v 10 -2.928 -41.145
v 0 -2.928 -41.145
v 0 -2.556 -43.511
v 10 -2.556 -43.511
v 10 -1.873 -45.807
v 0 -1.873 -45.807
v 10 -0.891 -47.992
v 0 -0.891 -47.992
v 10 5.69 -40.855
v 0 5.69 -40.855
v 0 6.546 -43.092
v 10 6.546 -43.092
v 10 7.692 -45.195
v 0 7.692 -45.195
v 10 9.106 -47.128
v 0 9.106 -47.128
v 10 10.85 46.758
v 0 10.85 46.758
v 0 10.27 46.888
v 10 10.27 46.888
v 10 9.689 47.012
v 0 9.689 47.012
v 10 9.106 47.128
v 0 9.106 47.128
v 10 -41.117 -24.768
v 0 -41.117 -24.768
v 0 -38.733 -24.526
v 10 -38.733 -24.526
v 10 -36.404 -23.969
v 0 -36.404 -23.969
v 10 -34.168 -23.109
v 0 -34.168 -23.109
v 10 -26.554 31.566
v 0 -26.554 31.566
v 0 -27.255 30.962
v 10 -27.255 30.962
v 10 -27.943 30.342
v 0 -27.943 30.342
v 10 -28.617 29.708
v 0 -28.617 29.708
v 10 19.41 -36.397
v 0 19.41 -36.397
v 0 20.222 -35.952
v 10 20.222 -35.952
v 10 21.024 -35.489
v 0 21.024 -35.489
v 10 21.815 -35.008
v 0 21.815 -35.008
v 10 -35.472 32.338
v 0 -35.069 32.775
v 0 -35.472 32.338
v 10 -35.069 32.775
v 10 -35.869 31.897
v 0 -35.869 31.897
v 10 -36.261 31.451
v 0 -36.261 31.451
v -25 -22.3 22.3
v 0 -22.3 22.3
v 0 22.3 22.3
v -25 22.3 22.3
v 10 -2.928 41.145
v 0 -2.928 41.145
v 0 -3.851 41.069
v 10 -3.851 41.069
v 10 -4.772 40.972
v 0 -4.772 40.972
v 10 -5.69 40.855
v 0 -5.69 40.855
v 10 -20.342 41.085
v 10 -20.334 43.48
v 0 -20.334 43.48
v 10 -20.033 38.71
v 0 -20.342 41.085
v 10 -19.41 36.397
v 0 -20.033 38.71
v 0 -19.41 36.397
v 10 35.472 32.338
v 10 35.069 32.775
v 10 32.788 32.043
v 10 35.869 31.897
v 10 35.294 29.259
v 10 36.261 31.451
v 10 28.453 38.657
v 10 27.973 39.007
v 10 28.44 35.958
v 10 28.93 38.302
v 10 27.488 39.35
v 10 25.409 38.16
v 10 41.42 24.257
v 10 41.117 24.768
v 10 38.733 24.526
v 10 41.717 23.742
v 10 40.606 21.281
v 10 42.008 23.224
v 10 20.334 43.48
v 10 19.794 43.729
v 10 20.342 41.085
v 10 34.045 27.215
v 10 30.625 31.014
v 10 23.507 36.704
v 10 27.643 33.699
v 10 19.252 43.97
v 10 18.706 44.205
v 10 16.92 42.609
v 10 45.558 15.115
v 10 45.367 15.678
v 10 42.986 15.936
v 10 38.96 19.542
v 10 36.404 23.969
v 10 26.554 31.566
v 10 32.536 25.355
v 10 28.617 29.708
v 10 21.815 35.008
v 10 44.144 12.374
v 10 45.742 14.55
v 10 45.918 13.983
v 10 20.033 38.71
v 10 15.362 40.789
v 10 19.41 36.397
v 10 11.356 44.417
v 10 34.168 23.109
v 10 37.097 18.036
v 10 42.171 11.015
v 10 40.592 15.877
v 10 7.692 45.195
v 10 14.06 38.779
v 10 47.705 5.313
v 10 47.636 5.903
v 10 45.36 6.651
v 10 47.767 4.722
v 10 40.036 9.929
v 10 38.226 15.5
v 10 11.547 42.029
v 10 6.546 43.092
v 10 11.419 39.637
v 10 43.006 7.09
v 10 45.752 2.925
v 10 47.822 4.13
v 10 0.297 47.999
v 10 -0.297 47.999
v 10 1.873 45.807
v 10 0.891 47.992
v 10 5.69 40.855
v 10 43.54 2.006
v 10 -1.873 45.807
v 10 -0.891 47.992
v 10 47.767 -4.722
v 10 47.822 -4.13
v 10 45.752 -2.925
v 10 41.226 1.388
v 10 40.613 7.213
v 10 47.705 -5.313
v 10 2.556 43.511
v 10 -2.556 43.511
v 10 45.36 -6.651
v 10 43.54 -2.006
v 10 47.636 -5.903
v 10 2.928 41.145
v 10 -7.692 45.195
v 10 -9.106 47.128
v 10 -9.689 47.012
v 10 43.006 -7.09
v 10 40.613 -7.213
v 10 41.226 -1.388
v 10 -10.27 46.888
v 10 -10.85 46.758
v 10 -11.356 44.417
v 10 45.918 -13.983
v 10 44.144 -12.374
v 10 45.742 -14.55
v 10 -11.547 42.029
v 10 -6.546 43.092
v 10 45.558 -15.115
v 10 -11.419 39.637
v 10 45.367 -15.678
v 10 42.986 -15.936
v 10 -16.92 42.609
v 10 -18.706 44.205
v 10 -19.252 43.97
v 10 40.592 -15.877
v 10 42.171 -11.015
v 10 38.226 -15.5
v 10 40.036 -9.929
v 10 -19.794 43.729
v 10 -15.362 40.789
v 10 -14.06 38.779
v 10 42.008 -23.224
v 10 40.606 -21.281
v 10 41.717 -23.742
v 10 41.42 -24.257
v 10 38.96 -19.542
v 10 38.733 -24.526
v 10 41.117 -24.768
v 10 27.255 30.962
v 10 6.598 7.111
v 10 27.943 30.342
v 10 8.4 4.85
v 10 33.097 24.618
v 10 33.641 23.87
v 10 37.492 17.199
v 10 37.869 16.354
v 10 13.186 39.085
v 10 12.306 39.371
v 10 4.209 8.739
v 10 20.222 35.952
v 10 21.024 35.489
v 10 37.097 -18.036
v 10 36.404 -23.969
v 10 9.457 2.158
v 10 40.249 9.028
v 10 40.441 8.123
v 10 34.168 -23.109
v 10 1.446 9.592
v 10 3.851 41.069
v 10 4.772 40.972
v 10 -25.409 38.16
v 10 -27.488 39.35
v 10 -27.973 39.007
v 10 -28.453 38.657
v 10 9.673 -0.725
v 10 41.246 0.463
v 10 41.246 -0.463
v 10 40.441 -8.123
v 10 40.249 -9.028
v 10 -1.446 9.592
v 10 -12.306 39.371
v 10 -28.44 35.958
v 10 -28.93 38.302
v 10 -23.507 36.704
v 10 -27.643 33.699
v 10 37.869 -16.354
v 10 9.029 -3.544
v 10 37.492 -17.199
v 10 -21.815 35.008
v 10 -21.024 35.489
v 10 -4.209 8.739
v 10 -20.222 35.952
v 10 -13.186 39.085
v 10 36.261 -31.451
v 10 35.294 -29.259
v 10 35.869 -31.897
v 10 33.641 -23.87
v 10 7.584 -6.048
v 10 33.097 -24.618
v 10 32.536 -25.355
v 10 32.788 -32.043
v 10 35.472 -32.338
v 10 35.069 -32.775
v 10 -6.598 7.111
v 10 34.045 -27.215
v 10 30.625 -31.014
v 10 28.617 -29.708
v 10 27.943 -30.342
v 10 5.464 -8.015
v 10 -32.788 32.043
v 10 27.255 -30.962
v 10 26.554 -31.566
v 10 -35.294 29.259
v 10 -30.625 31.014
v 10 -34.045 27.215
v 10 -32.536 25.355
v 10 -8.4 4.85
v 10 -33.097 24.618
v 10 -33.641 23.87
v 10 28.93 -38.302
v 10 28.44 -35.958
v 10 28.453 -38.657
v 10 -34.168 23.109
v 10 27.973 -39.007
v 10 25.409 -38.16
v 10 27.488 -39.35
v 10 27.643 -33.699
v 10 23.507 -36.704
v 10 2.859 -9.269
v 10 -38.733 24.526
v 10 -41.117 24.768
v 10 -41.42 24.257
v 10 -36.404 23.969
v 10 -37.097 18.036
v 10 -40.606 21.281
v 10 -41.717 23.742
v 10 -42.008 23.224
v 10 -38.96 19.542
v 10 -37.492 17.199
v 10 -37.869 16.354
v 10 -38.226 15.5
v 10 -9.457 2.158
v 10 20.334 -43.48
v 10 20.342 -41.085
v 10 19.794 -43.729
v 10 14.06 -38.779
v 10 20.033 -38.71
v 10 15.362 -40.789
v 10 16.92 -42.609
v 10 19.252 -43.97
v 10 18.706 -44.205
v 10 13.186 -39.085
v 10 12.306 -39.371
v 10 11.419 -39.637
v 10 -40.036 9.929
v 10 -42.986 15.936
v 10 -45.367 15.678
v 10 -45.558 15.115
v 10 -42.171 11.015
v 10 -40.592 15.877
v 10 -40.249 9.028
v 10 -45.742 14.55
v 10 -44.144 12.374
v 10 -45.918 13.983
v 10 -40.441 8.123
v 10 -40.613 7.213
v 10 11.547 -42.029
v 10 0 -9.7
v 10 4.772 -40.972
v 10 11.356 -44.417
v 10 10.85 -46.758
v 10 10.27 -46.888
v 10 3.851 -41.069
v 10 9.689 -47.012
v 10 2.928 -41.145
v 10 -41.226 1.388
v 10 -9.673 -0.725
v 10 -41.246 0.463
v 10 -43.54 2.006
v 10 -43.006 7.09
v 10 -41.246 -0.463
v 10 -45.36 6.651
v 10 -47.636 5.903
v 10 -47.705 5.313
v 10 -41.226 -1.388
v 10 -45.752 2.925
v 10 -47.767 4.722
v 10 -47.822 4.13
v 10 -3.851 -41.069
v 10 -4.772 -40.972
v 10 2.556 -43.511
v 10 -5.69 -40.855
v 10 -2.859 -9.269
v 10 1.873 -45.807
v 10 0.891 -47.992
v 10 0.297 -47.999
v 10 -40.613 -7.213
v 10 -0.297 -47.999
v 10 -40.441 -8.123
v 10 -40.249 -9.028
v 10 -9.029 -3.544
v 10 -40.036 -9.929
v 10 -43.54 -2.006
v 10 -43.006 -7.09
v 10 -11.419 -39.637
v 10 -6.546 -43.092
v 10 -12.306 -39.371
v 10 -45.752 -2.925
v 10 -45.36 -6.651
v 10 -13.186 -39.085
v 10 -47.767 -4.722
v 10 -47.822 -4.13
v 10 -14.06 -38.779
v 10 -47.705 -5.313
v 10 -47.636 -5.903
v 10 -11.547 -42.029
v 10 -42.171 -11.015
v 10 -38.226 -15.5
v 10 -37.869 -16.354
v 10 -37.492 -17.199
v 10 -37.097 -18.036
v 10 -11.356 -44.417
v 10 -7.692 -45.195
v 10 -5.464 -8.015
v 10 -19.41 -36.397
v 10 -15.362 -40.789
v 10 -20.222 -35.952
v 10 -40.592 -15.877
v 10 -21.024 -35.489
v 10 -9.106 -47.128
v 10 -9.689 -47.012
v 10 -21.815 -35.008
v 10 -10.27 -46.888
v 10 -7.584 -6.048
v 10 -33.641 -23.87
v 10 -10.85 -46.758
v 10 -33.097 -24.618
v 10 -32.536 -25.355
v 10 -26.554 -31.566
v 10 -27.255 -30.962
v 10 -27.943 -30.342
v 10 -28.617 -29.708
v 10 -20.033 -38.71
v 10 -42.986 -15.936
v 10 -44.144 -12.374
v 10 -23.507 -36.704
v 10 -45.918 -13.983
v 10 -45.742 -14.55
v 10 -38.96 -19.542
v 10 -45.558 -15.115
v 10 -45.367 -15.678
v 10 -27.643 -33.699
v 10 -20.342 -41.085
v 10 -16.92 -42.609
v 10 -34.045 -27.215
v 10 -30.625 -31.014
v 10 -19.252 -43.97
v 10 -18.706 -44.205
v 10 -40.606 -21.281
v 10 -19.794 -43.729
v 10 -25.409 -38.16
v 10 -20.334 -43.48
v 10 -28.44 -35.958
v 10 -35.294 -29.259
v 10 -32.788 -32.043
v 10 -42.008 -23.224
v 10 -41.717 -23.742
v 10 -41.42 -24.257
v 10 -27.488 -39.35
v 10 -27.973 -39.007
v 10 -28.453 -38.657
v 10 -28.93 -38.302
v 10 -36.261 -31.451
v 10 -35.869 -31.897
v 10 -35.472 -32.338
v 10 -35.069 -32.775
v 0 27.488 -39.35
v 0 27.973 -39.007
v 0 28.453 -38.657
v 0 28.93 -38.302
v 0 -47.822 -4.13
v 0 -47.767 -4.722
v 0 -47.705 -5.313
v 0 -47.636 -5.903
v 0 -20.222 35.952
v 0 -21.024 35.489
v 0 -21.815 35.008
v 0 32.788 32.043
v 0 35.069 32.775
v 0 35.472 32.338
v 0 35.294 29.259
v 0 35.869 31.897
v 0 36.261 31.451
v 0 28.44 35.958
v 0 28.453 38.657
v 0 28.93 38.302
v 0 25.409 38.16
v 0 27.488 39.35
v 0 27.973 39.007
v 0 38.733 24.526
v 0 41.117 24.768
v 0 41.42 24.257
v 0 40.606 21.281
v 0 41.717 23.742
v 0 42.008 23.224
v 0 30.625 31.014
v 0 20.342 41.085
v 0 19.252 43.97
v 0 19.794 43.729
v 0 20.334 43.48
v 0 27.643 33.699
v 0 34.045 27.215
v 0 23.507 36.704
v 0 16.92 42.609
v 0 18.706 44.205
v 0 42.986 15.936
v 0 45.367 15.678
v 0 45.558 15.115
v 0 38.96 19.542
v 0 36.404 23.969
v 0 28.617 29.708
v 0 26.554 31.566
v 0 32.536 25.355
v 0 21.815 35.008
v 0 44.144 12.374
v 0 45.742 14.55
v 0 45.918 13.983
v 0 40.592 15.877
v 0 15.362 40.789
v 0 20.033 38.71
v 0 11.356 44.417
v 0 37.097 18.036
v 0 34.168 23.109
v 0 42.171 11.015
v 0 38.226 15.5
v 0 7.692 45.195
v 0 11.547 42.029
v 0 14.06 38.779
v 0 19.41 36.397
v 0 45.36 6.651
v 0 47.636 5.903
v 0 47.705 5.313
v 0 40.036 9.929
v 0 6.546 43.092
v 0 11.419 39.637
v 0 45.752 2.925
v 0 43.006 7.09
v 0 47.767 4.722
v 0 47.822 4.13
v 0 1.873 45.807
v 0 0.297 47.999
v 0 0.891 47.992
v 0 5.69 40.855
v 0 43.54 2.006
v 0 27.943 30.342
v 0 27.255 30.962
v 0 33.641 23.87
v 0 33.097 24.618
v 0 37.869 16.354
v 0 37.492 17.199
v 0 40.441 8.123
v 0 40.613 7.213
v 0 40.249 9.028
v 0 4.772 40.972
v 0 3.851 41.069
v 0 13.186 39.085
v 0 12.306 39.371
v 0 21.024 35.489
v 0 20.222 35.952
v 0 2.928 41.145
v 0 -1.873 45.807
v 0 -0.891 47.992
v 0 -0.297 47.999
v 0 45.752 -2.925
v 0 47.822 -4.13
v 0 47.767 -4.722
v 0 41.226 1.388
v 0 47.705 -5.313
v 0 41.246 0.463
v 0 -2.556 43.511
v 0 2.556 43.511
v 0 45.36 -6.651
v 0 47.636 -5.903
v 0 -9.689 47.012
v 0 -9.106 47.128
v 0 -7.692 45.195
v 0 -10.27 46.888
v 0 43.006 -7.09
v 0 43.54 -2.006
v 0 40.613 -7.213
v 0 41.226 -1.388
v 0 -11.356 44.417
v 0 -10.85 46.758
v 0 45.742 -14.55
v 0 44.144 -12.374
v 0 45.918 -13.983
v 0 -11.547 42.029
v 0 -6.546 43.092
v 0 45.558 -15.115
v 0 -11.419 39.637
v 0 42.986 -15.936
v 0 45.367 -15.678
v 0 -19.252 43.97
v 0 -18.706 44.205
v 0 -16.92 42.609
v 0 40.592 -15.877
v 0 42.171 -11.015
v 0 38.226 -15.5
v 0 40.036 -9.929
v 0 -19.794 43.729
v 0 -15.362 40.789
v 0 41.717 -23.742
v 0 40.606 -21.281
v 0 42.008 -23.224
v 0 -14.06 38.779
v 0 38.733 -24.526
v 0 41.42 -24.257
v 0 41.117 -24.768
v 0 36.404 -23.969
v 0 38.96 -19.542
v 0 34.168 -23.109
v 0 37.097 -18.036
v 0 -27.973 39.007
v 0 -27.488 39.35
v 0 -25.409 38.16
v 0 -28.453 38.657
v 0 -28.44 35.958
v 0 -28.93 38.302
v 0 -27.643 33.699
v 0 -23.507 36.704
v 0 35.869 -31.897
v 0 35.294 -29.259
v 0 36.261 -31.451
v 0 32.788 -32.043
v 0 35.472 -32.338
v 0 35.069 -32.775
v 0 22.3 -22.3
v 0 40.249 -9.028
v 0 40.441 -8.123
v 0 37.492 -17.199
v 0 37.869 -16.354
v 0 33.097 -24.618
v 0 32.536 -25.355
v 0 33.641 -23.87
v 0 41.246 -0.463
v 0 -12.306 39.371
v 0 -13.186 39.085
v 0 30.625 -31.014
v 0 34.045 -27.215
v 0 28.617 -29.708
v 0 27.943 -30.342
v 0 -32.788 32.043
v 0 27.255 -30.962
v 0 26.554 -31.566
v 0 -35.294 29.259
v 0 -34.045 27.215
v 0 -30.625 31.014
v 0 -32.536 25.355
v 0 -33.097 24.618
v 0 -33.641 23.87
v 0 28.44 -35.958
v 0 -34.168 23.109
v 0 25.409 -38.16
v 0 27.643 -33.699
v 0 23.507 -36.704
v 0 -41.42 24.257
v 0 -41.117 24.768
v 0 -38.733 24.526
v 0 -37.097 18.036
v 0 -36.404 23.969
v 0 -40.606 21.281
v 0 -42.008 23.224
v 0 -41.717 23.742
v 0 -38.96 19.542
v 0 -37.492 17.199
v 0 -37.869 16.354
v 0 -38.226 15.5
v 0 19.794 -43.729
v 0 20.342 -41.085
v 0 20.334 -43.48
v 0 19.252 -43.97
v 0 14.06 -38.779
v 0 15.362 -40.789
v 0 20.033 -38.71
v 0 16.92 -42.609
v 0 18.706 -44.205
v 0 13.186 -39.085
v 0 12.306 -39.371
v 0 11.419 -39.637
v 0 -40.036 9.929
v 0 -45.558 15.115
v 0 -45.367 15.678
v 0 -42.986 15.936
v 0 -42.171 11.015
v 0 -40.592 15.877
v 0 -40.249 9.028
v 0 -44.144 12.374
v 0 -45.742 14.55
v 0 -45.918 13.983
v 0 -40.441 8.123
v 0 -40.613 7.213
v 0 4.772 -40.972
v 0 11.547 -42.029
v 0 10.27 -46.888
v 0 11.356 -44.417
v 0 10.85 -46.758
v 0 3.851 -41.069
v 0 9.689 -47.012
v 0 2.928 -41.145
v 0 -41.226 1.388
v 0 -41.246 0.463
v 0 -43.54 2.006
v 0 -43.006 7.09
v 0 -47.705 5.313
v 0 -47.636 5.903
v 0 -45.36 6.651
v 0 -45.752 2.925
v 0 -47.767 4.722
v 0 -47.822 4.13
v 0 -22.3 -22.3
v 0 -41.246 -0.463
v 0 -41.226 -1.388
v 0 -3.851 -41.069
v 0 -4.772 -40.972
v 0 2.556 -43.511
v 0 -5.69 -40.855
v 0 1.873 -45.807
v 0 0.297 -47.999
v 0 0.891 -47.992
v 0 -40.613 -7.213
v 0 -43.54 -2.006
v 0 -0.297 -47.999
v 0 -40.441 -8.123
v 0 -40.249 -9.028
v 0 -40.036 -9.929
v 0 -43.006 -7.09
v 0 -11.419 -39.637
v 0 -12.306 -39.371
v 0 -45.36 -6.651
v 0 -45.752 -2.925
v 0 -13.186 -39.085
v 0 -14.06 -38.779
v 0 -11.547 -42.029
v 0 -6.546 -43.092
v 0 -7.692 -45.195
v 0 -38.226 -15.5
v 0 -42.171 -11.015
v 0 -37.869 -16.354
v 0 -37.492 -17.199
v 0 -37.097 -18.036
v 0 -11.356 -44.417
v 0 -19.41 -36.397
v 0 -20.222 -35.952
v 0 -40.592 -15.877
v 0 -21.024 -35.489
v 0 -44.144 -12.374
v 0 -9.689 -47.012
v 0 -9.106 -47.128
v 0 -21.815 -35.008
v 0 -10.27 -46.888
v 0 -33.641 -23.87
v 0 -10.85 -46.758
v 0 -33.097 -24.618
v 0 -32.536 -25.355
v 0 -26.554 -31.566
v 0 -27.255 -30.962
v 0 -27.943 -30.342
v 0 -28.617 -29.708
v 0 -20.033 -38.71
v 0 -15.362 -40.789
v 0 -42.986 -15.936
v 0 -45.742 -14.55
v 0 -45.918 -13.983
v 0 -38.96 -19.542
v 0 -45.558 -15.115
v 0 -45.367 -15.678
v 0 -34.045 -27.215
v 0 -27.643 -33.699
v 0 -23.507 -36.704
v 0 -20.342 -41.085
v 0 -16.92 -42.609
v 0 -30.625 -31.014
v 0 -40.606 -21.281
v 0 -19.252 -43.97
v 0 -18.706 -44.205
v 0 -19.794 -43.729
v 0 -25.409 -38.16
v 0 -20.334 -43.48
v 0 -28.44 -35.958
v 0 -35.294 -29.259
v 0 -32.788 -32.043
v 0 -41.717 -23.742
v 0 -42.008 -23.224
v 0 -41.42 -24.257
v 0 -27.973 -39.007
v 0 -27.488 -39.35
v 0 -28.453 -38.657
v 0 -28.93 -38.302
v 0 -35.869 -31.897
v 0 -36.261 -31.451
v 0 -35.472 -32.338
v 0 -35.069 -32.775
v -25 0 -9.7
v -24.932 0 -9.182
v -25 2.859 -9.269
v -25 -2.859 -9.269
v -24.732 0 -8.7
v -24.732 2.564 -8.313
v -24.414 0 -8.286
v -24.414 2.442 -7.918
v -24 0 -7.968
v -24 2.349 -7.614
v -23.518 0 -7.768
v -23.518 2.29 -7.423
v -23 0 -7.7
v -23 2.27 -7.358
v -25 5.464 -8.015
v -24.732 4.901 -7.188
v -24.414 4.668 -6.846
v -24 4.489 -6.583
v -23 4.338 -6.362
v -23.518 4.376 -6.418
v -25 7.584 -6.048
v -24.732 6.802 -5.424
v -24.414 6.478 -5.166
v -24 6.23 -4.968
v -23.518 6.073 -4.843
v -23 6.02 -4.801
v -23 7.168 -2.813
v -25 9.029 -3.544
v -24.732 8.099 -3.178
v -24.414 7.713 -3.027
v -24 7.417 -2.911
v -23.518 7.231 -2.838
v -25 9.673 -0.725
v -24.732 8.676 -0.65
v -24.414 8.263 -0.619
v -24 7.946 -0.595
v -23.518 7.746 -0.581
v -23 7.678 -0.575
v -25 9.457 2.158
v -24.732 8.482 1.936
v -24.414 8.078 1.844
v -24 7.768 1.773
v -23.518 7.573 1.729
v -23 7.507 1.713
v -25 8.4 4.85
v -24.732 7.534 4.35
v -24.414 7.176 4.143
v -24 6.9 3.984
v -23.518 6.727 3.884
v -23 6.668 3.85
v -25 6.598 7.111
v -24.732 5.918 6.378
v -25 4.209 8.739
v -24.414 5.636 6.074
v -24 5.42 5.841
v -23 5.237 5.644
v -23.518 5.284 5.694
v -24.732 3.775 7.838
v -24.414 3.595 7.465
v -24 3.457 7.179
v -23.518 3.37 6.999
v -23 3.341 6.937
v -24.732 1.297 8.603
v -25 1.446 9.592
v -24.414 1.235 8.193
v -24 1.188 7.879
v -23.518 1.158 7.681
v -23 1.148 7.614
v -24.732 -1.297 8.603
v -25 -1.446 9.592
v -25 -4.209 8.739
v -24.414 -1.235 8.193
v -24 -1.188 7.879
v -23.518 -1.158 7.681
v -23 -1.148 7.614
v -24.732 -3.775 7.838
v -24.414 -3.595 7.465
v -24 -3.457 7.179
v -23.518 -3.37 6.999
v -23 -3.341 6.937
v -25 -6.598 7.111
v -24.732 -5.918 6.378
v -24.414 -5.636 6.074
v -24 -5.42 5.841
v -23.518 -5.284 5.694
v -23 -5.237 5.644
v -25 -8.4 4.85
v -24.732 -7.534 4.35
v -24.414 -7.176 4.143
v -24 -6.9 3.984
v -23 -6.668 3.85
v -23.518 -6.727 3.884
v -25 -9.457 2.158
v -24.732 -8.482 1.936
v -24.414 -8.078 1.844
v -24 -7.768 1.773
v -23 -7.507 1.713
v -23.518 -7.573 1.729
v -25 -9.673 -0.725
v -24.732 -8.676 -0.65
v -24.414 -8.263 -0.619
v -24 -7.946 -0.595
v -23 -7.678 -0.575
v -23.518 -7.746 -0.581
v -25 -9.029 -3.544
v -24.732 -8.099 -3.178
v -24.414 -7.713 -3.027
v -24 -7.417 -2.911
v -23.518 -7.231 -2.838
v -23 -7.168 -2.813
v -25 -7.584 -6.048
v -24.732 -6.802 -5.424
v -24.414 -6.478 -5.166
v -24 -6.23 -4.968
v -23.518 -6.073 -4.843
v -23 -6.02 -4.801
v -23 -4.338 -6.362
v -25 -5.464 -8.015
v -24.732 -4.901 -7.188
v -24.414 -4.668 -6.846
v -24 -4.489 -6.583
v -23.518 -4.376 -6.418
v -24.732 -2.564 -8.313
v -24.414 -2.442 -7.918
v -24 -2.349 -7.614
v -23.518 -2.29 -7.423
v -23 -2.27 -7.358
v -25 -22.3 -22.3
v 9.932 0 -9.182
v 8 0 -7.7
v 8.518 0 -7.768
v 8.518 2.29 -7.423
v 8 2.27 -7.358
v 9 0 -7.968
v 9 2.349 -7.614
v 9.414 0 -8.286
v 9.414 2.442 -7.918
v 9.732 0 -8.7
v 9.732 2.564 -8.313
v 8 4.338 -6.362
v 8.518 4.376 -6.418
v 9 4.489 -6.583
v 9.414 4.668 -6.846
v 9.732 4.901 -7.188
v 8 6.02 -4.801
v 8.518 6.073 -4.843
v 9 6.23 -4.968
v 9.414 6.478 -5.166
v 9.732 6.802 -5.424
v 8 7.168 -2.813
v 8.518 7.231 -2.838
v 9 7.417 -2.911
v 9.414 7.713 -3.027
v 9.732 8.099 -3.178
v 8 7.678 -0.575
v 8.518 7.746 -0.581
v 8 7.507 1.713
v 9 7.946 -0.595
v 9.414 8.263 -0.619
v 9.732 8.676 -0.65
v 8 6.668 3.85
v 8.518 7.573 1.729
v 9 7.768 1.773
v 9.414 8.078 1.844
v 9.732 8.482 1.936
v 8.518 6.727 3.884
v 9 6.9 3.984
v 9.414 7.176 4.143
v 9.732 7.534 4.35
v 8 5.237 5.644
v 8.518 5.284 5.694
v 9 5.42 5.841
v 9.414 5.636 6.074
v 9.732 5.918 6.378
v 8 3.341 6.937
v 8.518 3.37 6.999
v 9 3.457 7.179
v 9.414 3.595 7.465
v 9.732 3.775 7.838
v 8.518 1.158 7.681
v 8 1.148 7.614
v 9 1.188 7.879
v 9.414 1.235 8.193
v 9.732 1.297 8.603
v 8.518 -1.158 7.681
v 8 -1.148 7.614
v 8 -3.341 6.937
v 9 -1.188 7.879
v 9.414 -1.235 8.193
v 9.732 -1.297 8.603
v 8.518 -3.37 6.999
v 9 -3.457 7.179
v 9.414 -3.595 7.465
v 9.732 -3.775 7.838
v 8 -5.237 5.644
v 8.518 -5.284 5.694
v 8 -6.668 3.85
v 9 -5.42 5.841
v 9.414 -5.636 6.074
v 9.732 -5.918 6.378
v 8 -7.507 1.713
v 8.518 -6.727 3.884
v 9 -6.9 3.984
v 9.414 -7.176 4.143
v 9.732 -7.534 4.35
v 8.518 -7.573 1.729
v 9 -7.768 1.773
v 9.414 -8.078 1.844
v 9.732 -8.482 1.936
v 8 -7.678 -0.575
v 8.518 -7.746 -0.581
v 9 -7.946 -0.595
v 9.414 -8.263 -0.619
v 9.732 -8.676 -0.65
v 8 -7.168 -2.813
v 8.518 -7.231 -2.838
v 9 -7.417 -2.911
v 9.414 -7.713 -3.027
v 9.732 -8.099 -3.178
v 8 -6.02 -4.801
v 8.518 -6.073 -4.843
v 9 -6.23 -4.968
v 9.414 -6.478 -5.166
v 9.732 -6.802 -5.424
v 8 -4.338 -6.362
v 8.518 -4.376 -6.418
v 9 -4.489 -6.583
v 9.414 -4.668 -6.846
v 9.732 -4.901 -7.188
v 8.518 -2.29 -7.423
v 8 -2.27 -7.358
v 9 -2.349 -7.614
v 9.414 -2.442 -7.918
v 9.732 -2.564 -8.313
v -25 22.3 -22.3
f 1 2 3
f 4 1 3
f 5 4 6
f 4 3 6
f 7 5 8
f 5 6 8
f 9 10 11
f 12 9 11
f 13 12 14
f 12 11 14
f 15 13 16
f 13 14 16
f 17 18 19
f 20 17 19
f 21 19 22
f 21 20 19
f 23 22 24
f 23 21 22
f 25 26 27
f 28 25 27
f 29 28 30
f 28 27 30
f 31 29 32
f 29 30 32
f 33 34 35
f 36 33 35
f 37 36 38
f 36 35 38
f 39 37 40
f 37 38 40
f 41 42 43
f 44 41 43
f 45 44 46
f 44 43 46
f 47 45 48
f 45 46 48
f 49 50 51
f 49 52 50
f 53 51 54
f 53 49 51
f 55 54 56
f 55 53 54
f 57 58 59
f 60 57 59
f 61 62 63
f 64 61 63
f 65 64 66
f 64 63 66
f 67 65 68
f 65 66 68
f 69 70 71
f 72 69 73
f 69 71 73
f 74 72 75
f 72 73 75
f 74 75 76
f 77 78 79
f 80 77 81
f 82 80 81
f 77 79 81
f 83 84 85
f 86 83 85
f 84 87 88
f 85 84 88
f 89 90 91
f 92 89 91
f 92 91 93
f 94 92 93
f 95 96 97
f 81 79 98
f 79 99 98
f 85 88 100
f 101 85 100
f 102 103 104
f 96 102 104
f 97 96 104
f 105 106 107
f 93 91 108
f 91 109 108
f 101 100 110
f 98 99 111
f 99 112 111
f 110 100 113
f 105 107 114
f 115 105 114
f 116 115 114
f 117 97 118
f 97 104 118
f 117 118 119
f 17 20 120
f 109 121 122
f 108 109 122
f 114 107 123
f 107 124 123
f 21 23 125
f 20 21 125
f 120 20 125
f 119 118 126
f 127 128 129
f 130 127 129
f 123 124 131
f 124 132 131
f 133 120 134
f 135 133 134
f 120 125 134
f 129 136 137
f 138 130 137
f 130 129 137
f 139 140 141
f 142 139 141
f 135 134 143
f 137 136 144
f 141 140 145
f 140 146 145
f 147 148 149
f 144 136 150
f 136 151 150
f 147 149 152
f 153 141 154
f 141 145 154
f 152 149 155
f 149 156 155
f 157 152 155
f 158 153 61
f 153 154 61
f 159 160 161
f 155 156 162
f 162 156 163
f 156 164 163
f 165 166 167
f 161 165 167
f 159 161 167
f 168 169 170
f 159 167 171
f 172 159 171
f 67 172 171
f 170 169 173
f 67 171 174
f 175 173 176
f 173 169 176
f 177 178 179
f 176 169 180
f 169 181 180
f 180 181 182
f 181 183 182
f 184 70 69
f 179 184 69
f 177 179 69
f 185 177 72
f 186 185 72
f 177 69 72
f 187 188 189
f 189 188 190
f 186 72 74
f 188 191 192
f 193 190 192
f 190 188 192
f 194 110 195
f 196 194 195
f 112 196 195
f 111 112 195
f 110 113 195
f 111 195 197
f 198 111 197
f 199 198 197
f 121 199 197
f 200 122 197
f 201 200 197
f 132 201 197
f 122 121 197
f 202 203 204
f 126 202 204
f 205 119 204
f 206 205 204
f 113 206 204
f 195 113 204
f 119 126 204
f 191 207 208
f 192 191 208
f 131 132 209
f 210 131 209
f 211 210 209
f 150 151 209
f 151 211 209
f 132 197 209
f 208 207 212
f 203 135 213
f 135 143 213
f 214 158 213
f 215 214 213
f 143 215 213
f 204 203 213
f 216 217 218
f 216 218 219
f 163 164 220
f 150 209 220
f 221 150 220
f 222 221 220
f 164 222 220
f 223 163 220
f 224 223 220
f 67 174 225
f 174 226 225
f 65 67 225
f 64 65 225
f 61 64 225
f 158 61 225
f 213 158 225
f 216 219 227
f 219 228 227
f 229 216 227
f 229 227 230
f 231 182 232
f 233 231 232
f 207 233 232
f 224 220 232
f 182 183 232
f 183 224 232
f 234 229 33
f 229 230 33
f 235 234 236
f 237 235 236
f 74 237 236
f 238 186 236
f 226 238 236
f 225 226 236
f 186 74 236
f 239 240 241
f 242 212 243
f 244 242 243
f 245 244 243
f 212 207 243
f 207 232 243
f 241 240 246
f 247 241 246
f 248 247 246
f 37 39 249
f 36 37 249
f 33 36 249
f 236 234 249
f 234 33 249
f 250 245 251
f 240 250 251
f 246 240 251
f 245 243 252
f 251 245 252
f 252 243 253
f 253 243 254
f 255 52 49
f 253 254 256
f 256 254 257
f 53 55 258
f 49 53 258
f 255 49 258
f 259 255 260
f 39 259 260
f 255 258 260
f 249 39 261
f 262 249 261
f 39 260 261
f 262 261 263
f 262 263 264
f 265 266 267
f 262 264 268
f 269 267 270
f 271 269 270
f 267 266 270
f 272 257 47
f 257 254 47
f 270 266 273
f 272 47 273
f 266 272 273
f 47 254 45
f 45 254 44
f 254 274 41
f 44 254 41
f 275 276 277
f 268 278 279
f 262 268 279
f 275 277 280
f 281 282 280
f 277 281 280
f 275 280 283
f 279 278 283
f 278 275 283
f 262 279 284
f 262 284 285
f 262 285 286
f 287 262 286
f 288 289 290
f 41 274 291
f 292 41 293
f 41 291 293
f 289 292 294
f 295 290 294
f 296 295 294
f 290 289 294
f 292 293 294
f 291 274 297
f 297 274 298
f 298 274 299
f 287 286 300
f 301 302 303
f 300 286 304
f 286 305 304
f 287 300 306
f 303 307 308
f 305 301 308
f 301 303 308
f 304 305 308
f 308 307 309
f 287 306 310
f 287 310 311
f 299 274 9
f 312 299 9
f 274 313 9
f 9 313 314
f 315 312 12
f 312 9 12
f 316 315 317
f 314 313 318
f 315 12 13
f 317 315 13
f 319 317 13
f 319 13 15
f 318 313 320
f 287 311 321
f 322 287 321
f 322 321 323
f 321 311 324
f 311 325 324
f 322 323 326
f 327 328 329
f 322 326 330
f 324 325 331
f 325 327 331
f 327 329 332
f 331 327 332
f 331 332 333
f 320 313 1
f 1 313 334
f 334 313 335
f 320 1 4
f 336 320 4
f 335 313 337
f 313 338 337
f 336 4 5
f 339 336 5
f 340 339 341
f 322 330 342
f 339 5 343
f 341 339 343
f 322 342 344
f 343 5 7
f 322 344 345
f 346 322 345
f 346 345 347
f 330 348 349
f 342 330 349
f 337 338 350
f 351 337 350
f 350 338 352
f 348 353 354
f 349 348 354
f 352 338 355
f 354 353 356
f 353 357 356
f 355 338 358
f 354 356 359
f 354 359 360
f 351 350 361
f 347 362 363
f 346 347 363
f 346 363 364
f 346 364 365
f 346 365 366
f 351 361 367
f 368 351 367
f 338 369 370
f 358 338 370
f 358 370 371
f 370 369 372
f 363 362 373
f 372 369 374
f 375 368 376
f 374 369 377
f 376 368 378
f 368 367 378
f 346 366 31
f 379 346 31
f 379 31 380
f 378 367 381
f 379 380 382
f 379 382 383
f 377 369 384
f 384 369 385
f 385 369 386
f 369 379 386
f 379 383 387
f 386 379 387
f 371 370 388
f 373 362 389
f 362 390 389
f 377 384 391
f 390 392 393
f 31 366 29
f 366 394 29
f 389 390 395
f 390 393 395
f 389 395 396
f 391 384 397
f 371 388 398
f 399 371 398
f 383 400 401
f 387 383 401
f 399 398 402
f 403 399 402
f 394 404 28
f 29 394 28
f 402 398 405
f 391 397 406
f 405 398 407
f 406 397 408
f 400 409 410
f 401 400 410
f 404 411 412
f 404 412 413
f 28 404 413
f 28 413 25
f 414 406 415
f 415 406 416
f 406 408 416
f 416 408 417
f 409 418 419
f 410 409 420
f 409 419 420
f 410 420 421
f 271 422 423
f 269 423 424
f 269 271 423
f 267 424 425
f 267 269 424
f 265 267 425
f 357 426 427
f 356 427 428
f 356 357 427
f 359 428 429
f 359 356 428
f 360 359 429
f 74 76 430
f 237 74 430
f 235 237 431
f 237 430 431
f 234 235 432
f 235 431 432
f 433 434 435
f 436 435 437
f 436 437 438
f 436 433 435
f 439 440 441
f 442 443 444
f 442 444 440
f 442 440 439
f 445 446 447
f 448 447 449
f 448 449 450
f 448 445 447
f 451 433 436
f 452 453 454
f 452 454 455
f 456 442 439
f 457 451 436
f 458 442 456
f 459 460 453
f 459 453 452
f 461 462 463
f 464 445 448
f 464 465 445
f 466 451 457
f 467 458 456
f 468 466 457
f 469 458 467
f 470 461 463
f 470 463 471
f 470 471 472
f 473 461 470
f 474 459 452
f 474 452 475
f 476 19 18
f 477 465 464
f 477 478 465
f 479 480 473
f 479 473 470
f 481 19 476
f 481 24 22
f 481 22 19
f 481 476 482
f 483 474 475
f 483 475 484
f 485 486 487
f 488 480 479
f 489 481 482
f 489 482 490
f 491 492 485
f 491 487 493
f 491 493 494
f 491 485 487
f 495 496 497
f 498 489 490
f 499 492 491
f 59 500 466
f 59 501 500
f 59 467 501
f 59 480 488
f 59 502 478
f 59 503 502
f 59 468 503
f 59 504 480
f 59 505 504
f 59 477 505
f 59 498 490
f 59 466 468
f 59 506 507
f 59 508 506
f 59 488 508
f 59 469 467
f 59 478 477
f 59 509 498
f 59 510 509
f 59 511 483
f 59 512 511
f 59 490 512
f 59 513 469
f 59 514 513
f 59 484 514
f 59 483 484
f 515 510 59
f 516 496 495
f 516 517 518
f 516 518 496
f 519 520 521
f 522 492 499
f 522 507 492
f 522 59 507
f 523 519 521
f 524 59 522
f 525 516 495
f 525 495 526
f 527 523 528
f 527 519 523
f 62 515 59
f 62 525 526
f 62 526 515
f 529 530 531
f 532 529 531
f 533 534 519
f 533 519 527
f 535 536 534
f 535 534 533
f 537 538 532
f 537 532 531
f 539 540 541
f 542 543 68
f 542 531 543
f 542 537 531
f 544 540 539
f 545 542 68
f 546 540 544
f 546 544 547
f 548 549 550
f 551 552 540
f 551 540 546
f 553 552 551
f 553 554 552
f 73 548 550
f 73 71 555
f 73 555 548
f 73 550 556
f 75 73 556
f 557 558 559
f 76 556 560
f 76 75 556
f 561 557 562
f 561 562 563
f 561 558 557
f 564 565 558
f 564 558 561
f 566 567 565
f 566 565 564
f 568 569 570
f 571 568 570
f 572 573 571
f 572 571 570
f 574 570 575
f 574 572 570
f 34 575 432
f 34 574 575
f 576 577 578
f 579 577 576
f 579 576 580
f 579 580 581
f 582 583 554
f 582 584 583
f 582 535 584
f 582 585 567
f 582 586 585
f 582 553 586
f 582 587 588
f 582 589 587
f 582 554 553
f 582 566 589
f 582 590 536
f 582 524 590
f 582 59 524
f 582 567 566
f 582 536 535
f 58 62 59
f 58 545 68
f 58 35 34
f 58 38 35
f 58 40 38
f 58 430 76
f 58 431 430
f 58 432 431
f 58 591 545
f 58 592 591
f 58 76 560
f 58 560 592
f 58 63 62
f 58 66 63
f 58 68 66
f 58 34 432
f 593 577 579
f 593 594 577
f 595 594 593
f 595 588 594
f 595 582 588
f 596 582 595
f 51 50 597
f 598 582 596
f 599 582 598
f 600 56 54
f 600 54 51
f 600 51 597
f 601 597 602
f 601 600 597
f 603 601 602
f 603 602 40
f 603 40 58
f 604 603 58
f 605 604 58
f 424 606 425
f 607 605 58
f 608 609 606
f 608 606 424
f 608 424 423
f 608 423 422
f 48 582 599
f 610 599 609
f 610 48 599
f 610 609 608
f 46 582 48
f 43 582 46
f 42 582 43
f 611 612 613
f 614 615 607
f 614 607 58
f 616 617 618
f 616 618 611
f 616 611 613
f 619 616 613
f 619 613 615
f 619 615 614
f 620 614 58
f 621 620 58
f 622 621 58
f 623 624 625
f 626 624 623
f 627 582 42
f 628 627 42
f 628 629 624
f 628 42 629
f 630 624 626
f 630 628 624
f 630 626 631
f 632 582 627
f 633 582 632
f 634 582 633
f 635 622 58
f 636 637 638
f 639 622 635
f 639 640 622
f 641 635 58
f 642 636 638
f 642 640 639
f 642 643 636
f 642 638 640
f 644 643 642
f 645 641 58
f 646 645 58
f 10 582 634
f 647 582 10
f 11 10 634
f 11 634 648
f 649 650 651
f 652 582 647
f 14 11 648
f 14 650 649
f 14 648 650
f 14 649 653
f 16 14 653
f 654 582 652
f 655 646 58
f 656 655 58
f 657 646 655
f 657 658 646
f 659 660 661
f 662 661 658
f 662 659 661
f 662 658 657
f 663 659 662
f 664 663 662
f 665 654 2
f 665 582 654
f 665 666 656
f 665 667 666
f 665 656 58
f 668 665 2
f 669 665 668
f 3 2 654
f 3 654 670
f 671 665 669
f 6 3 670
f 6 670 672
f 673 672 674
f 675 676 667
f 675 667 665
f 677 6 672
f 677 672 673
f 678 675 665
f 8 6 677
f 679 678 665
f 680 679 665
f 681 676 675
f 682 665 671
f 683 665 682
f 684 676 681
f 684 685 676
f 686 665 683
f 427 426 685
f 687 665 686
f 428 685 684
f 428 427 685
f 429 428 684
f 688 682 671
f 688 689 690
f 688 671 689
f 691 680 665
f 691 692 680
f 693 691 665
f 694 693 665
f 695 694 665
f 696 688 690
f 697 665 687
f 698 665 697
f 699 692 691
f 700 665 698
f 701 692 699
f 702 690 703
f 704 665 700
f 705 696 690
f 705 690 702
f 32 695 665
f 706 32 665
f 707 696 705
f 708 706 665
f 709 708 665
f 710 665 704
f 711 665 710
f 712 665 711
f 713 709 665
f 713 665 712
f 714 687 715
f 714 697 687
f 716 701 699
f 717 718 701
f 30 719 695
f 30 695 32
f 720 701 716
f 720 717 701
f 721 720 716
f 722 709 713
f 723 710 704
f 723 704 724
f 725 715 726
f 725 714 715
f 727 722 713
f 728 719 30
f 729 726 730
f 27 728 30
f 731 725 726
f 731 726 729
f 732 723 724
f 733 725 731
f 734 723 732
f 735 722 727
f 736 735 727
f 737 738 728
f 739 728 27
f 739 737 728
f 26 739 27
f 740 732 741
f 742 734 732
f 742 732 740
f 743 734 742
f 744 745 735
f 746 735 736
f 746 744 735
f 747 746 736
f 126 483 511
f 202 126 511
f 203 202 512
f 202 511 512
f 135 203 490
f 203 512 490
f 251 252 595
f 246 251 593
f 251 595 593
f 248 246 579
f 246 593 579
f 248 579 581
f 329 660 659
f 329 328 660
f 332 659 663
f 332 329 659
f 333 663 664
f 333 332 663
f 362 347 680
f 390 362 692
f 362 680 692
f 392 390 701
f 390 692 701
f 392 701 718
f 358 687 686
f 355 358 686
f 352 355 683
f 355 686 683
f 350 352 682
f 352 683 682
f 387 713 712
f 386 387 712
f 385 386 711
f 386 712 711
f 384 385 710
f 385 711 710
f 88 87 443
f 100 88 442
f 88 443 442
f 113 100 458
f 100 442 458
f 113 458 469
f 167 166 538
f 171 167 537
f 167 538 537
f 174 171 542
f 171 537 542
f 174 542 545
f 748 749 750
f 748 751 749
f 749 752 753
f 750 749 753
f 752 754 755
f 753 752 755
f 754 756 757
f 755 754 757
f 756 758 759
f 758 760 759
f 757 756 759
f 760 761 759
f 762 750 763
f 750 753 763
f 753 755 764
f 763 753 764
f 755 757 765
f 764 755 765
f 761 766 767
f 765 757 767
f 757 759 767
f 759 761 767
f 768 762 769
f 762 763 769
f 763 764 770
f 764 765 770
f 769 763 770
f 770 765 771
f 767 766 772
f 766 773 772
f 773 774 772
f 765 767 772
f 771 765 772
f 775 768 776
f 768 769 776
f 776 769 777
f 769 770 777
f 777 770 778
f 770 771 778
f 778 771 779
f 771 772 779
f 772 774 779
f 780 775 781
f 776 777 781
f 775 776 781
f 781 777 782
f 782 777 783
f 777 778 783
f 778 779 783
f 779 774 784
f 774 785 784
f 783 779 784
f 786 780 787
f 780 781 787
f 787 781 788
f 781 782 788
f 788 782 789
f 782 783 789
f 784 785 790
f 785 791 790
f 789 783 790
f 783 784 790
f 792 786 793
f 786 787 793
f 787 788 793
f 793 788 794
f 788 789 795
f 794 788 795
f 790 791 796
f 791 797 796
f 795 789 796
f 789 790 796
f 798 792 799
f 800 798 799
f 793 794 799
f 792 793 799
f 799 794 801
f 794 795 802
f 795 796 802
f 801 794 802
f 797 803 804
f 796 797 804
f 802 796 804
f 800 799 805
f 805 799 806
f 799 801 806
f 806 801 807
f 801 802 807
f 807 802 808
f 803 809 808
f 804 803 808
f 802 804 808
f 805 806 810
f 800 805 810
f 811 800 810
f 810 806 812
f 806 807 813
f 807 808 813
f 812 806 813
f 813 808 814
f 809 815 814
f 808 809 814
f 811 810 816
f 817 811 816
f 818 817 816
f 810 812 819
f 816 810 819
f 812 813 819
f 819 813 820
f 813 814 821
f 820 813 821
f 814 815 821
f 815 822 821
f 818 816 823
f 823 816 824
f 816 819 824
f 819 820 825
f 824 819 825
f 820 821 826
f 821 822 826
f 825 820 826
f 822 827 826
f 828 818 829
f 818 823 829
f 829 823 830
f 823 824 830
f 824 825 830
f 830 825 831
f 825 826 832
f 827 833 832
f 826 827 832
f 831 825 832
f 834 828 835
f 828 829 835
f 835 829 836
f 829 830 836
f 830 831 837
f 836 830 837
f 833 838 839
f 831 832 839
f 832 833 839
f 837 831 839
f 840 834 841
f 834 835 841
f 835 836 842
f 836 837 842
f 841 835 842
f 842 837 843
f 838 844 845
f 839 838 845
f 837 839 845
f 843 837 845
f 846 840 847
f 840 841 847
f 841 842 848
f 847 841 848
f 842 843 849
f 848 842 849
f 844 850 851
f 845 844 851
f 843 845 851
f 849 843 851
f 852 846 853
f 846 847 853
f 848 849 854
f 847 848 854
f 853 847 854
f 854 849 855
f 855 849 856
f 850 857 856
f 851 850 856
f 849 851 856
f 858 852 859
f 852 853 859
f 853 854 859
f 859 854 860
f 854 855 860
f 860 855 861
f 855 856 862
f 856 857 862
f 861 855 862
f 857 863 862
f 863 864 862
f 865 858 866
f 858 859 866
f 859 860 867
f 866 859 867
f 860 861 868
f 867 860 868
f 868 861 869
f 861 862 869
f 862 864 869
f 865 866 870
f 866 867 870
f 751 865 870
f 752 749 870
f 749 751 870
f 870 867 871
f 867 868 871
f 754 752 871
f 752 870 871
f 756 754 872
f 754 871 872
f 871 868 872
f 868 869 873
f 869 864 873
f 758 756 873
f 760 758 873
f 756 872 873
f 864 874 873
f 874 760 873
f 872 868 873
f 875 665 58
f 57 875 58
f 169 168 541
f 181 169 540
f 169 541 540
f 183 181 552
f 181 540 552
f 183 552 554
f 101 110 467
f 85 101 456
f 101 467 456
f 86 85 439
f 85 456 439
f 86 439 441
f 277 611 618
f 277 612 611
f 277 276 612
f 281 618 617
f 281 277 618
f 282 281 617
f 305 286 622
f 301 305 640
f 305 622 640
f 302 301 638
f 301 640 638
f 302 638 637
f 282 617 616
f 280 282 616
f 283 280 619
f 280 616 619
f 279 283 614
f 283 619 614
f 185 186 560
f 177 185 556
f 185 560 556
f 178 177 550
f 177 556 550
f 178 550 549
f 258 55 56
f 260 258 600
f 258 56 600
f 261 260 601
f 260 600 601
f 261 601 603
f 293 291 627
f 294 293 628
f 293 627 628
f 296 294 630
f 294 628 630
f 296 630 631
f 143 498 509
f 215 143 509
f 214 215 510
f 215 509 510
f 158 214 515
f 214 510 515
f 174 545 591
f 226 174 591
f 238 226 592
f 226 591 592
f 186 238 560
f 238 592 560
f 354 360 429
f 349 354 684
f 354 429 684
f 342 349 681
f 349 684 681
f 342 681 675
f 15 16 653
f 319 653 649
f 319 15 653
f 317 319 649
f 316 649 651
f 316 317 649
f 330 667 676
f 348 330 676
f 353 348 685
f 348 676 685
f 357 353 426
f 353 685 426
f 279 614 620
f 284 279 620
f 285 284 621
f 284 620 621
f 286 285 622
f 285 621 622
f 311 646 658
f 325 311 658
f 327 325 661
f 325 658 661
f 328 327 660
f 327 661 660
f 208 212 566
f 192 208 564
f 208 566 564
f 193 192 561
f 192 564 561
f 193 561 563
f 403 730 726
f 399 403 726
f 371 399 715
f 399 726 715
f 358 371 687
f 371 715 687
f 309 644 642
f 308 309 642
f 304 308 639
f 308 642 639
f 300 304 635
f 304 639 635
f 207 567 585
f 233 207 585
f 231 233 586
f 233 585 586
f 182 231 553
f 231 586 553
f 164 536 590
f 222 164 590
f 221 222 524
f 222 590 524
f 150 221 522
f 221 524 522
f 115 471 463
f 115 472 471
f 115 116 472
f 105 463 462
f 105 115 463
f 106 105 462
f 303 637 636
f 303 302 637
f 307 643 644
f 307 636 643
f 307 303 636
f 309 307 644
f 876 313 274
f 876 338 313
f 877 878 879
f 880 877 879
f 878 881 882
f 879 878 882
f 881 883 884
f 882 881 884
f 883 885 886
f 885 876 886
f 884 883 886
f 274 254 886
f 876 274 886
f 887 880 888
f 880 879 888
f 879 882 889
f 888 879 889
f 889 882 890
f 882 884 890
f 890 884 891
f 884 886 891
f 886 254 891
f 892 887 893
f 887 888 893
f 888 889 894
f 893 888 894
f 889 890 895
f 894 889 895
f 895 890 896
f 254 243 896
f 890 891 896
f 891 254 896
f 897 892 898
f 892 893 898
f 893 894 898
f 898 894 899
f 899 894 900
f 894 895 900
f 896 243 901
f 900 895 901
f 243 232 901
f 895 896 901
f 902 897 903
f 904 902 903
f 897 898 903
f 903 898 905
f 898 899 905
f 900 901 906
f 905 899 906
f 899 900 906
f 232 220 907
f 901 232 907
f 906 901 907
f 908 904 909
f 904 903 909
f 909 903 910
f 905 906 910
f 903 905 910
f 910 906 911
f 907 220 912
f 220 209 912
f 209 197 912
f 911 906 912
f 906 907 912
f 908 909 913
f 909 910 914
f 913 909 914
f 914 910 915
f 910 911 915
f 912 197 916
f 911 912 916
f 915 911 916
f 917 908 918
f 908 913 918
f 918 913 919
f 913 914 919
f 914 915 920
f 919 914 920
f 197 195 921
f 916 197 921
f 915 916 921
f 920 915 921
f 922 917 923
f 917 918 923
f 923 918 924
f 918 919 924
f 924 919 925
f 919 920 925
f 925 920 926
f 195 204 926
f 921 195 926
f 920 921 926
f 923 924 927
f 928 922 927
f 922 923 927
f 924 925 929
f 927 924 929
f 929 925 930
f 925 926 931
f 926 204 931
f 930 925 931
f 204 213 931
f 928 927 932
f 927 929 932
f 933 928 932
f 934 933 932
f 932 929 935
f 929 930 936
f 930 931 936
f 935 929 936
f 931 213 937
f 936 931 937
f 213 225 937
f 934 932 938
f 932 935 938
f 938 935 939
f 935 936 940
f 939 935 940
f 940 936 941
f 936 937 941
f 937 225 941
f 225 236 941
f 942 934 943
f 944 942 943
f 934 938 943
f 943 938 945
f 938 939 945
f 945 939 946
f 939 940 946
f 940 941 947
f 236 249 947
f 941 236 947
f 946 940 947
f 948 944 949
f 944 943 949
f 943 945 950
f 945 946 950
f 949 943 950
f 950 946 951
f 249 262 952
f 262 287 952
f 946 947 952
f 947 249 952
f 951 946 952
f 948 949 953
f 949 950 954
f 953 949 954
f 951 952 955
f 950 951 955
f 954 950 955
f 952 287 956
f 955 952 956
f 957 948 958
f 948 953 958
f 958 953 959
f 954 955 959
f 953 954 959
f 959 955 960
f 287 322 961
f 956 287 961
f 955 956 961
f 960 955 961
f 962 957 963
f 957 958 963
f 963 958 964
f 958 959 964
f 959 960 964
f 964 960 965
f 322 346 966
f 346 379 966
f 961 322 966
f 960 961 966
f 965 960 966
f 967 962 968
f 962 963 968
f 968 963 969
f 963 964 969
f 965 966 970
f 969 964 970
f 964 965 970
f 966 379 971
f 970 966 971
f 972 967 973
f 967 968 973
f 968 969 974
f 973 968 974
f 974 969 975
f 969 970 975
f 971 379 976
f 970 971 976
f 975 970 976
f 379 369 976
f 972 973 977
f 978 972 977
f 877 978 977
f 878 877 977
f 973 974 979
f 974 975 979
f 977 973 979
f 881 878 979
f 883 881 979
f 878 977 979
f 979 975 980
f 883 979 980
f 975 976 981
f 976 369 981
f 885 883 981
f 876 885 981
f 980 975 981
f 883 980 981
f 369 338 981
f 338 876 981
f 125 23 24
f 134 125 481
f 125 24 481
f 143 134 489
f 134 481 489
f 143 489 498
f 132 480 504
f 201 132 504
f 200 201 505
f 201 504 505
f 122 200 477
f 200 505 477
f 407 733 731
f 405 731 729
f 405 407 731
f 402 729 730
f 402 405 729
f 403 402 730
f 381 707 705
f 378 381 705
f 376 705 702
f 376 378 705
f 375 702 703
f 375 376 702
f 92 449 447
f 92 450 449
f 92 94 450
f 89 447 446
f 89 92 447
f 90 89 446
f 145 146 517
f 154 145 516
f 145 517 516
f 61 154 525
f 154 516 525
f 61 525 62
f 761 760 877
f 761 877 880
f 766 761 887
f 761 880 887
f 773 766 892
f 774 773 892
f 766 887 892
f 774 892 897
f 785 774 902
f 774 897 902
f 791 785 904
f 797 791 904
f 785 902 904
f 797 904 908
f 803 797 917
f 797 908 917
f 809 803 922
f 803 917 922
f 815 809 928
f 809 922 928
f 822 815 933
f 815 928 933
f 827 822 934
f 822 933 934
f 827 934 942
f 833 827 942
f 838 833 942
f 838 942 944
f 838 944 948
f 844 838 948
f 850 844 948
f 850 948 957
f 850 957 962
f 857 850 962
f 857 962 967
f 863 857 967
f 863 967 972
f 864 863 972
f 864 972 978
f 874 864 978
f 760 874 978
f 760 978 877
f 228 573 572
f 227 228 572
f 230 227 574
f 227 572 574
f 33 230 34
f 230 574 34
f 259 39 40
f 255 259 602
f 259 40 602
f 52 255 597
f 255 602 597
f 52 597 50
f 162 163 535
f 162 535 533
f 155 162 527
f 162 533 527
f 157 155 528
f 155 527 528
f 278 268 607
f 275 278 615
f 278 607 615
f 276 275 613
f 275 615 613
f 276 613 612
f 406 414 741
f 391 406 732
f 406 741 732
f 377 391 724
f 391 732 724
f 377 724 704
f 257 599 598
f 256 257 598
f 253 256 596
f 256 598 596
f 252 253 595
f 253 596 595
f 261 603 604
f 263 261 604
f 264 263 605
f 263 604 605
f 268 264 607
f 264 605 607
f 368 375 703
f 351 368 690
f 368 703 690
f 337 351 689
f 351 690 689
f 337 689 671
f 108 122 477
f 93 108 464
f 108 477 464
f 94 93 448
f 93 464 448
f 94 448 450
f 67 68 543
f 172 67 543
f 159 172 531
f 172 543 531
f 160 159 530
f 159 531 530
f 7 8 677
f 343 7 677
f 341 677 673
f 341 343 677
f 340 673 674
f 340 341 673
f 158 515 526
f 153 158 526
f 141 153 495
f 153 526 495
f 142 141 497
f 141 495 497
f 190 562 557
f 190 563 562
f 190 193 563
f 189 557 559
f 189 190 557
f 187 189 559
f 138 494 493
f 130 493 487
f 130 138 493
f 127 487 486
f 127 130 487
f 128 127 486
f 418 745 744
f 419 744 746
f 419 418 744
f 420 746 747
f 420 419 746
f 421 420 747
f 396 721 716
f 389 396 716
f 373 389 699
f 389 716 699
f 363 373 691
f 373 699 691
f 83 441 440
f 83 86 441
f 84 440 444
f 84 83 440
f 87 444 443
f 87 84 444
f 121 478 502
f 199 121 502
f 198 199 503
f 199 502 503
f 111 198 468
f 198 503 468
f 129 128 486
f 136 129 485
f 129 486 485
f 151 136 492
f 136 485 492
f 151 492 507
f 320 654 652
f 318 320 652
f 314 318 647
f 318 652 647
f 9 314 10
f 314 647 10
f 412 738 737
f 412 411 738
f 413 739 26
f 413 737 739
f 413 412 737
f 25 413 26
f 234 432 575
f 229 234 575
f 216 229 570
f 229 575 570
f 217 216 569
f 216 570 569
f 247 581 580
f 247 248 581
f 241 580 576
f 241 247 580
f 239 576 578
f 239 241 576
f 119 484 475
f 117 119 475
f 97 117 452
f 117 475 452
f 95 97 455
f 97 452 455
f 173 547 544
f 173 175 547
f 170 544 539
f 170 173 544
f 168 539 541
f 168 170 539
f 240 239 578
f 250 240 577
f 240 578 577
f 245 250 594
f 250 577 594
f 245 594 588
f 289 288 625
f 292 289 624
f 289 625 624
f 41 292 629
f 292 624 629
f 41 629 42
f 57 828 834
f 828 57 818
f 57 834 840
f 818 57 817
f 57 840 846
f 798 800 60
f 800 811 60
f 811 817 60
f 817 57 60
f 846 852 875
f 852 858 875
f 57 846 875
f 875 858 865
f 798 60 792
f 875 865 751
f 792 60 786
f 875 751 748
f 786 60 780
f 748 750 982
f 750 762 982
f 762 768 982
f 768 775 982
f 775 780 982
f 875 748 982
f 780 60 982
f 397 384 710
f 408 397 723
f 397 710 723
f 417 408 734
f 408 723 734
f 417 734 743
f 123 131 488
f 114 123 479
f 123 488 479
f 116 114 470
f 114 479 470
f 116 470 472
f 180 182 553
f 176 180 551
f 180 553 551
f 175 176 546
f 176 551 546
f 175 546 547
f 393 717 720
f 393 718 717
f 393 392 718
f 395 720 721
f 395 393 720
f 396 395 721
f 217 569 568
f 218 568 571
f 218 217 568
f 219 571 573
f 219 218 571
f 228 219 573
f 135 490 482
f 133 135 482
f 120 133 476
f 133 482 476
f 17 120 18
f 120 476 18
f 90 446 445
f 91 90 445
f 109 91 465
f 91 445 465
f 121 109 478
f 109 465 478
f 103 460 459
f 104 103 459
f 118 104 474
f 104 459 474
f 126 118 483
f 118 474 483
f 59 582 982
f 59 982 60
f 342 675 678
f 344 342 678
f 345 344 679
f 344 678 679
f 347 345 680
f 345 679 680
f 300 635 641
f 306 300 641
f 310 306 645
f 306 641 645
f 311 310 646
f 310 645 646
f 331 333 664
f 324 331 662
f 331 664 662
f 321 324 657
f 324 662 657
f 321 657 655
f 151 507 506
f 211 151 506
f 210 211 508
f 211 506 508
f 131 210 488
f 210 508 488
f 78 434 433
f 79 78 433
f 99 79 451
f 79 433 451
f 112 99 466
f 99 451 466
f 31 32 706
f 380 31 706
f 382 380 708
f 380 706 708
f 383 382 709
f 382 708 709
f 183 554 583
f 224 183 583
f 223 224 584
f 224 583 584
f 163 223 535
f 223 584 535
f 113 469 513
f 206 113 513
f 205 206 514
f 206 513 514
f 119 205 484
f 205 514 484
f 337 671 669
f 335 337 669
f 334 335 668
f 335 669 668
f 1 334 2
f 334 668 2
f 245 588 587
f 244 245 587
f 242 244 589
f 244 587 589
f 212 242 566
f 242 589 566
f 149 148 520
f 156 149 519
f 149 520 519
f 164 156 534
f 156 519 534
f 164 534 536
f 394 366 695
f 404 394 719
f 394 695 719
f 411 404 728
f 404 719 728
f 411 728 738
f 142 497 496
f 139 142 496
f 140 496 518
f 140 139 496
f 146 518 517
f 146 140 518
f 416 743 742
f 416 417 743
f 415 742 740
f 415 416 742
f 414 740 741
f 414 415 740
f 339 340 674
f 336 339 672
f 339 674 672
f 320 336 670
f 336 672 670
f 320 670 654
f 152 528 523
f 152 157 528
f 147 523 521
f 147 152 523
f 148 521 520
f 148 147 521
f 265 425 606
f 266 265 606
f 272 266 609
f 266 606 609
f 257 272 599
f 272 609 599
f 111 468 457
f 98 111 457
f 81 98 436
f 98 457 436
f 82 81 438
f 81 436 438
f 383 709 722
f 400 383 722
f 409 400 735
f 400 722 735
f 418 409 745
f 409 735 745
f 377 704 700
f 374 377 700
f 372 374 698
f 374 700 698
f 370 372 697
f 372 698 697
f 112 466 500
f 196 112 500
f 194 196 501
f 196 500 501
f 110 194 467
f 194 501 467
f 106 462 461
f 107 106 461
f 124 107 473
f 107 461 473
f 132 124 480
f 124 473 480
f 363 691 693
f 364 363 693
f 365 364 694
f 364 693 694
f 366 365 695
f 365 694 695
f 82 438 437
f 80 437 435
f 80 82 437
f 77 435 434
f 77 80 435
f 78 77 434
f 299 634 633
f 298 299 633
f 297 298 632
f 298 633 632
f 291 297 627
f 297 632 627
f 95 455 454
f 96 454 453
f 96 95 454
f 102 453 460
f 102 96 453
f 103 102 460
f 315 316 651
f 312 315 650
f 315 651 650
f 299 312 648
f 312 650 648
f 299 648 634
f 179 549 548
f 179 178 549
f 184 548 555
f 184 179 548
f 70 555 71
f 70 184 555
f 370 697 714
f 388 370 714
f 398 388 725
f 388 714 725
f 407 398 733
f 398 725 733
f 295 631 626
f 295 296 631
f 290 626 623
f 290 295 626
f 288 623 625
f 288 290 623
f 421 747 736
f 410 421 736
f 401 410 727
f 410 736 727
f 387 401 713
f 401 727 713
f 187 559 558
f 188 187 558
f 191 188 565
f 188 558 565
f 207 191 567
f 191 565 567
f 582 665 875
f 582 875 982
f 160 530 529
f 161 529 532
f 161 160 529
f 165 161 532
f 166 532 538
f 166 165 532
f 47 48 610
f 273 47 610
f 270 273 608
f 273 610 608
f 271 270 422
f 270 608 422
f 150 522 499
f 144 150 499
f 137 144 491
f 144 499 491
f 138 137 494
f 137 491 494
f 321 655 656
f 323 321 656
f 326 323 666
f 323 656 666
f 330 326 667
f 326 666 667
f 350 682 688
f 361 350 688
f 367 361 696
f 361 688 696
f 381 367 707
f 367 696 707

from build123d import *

# Parameters (mm, degrees)
BASPROSKE_W         = 10
BASPROSKE_H         = 48
TOOTHCUT_DEPTH      = 69.614867194
TEETHCUTS_COUNT     = 30
TEETHCUTS_ANGLE     = 348
BORSKE_R            = 5
BORE_DEPTH          = 50.0000508
SKETCH2_W           = 44.6
SKETCH2_H           = 44.6
BOSS_EXTRUDE1_DEPTH = 60
CUT_EXTRUDE1_REACH  = 99.421
SKETCH1_R           = 7.7
CUT_EXTRUDE2_REACH  = 106.024
SKETCH3_W           = 35
SKETCH3_H           = 44.6
FILLET1_R           = 2


with BuildPart() as part:
    # BasProSke → Base-Revolve (revolve)
    with BuildSketch(Plane(origin=(0, 0, 0), x_dir=(1, 0, 0), z_dir=(0, 1, 0)), mode=Mode.PRIVATE) as base_revolve_sk:
        with Locations((5, 24)):
            Rectangle(BASPROSKE_W, BASPROSKE_H)
    revolve(base_revolve_sk.sketch.rotate(Axis((-10, 0, 0), (1, 0, 0)), 180), axis=Axis((-10, 0, 0), (1, 0, 0)))

    # TooCutSke → ToothCut (cut, through all)
    with BuildSketch(Plane(origin=(0, 0, 0), x_dir=(0, 0, -1), z_dir=(1, 0, 0))):
        with BuildLine():
            ThreePointArc((1.388358102, 41.225628713), (0, 41.249), (-1.388358102, 41.225628713))
            ThreePointArc((-1.388358102, 41.225628713), (-2.434419088, 44.674608087), (-4.146627223, 47.846050285))
            ThreePointArc((-4.146627223, 47.846050285), (0, 48.0254), (4.146627223, 47.846050285))
            ThreePointArc((4.146627223, 47.846050285), (2.434419088, 44.674608087), (1.388358102, 41.225628713))
        make_face()
    toothcut = extrude(amount=TOOTHCUT_DEPTH, mode=Mode.SUBTRACT)

    # TeethCuts: ToothCut ×30 about axis
    teethcuts_axis = Axis((-10, 0, 0), (1, 0, 0))
    for i in range(1, TEETHCUTS_COUNT):
        add(toothcut.rotate(teethcuts_axis, i * TEETHCUTS_ANGLE / (TEETHCUTS_COUNT - 1)), mode=Mode.SUBTRACT)

    # BorSke → Bore (cut, symmetric)
    with BuildSketch(Plane(origin=(0, 0, 0), x_dir=(0, 0, -1), z_dir=(1, 0, 0))):
        with Locations(Location((0, 0, 0), (0, 0, 180))):
            Circle(BORSKE_R)
    extrude(amount=BORE_DEPTH, both=True, mode=Mode.SUBTRACT)

    # Sketch2 → Boss-Extrude1 (add)
    with BuildSketch(Plane.ZY):
        Rectangle(SKETCH2_W, SKETCH2_H)
    extrude(amount=BOSS_EXTRUDE1_DEPTH)

    # Sketch1 → Cut-Extrude1 (cut, up to next)
    with BuildSketch(Plane(origin=(10, 0, 0), x_dir=(0, 0, -1), z_dir=(1, 0, 0)), mode=Mode.PRIVATE) as cut_extrude1_sk1:
        Circle(SKETCH1_R)
    cut_extrude1_tool1 = extrude(cut_extrude1_sk1.sketch, amount=-CUT_EXTRUDE1_REACH, mode=Mode.PRIVATE) & part.part
    add(cut_extrude1_tool1.solids().sort_by_distance((10, 0, 0))[0], mode=Mode.SUBTRACT)

    # Sketch3 → Cut-Extrude2 (cut, up to next)
    with BuildSketch(Plane(origin=(0, 22.3, 0), x_dir=(1, 0, 0), z_dir=(0, 1, 0)), mode=Mode.PRIVATE) as cut_extrude2_sk1:
        with Locations((-42.5, 0)):
            Rectangle(SKETCH3_W, SKETCH3_H)
    cut_extrude2_tool1 = extrude(cut_extrude2_sk1.sketch, amount=-CUT_EXTRUDE2_REACH, mode=Mode.PRIVATE) & part.part
    add(cut_extrude2_tool1.solids().sort_by_distance((-42.5, 22.3, 0))[0], mode=Mode.SUBTRACT)

    # Fillet1
    fillet1_edges = [part.edges().sort_by_distance(p)[0] for p in [
        (10, 0, 7.7),
        (-25, 0, 7.7),
    ]]
    fillet(fillet1_edges, radius=FILLET1_R)


solid = part.part
